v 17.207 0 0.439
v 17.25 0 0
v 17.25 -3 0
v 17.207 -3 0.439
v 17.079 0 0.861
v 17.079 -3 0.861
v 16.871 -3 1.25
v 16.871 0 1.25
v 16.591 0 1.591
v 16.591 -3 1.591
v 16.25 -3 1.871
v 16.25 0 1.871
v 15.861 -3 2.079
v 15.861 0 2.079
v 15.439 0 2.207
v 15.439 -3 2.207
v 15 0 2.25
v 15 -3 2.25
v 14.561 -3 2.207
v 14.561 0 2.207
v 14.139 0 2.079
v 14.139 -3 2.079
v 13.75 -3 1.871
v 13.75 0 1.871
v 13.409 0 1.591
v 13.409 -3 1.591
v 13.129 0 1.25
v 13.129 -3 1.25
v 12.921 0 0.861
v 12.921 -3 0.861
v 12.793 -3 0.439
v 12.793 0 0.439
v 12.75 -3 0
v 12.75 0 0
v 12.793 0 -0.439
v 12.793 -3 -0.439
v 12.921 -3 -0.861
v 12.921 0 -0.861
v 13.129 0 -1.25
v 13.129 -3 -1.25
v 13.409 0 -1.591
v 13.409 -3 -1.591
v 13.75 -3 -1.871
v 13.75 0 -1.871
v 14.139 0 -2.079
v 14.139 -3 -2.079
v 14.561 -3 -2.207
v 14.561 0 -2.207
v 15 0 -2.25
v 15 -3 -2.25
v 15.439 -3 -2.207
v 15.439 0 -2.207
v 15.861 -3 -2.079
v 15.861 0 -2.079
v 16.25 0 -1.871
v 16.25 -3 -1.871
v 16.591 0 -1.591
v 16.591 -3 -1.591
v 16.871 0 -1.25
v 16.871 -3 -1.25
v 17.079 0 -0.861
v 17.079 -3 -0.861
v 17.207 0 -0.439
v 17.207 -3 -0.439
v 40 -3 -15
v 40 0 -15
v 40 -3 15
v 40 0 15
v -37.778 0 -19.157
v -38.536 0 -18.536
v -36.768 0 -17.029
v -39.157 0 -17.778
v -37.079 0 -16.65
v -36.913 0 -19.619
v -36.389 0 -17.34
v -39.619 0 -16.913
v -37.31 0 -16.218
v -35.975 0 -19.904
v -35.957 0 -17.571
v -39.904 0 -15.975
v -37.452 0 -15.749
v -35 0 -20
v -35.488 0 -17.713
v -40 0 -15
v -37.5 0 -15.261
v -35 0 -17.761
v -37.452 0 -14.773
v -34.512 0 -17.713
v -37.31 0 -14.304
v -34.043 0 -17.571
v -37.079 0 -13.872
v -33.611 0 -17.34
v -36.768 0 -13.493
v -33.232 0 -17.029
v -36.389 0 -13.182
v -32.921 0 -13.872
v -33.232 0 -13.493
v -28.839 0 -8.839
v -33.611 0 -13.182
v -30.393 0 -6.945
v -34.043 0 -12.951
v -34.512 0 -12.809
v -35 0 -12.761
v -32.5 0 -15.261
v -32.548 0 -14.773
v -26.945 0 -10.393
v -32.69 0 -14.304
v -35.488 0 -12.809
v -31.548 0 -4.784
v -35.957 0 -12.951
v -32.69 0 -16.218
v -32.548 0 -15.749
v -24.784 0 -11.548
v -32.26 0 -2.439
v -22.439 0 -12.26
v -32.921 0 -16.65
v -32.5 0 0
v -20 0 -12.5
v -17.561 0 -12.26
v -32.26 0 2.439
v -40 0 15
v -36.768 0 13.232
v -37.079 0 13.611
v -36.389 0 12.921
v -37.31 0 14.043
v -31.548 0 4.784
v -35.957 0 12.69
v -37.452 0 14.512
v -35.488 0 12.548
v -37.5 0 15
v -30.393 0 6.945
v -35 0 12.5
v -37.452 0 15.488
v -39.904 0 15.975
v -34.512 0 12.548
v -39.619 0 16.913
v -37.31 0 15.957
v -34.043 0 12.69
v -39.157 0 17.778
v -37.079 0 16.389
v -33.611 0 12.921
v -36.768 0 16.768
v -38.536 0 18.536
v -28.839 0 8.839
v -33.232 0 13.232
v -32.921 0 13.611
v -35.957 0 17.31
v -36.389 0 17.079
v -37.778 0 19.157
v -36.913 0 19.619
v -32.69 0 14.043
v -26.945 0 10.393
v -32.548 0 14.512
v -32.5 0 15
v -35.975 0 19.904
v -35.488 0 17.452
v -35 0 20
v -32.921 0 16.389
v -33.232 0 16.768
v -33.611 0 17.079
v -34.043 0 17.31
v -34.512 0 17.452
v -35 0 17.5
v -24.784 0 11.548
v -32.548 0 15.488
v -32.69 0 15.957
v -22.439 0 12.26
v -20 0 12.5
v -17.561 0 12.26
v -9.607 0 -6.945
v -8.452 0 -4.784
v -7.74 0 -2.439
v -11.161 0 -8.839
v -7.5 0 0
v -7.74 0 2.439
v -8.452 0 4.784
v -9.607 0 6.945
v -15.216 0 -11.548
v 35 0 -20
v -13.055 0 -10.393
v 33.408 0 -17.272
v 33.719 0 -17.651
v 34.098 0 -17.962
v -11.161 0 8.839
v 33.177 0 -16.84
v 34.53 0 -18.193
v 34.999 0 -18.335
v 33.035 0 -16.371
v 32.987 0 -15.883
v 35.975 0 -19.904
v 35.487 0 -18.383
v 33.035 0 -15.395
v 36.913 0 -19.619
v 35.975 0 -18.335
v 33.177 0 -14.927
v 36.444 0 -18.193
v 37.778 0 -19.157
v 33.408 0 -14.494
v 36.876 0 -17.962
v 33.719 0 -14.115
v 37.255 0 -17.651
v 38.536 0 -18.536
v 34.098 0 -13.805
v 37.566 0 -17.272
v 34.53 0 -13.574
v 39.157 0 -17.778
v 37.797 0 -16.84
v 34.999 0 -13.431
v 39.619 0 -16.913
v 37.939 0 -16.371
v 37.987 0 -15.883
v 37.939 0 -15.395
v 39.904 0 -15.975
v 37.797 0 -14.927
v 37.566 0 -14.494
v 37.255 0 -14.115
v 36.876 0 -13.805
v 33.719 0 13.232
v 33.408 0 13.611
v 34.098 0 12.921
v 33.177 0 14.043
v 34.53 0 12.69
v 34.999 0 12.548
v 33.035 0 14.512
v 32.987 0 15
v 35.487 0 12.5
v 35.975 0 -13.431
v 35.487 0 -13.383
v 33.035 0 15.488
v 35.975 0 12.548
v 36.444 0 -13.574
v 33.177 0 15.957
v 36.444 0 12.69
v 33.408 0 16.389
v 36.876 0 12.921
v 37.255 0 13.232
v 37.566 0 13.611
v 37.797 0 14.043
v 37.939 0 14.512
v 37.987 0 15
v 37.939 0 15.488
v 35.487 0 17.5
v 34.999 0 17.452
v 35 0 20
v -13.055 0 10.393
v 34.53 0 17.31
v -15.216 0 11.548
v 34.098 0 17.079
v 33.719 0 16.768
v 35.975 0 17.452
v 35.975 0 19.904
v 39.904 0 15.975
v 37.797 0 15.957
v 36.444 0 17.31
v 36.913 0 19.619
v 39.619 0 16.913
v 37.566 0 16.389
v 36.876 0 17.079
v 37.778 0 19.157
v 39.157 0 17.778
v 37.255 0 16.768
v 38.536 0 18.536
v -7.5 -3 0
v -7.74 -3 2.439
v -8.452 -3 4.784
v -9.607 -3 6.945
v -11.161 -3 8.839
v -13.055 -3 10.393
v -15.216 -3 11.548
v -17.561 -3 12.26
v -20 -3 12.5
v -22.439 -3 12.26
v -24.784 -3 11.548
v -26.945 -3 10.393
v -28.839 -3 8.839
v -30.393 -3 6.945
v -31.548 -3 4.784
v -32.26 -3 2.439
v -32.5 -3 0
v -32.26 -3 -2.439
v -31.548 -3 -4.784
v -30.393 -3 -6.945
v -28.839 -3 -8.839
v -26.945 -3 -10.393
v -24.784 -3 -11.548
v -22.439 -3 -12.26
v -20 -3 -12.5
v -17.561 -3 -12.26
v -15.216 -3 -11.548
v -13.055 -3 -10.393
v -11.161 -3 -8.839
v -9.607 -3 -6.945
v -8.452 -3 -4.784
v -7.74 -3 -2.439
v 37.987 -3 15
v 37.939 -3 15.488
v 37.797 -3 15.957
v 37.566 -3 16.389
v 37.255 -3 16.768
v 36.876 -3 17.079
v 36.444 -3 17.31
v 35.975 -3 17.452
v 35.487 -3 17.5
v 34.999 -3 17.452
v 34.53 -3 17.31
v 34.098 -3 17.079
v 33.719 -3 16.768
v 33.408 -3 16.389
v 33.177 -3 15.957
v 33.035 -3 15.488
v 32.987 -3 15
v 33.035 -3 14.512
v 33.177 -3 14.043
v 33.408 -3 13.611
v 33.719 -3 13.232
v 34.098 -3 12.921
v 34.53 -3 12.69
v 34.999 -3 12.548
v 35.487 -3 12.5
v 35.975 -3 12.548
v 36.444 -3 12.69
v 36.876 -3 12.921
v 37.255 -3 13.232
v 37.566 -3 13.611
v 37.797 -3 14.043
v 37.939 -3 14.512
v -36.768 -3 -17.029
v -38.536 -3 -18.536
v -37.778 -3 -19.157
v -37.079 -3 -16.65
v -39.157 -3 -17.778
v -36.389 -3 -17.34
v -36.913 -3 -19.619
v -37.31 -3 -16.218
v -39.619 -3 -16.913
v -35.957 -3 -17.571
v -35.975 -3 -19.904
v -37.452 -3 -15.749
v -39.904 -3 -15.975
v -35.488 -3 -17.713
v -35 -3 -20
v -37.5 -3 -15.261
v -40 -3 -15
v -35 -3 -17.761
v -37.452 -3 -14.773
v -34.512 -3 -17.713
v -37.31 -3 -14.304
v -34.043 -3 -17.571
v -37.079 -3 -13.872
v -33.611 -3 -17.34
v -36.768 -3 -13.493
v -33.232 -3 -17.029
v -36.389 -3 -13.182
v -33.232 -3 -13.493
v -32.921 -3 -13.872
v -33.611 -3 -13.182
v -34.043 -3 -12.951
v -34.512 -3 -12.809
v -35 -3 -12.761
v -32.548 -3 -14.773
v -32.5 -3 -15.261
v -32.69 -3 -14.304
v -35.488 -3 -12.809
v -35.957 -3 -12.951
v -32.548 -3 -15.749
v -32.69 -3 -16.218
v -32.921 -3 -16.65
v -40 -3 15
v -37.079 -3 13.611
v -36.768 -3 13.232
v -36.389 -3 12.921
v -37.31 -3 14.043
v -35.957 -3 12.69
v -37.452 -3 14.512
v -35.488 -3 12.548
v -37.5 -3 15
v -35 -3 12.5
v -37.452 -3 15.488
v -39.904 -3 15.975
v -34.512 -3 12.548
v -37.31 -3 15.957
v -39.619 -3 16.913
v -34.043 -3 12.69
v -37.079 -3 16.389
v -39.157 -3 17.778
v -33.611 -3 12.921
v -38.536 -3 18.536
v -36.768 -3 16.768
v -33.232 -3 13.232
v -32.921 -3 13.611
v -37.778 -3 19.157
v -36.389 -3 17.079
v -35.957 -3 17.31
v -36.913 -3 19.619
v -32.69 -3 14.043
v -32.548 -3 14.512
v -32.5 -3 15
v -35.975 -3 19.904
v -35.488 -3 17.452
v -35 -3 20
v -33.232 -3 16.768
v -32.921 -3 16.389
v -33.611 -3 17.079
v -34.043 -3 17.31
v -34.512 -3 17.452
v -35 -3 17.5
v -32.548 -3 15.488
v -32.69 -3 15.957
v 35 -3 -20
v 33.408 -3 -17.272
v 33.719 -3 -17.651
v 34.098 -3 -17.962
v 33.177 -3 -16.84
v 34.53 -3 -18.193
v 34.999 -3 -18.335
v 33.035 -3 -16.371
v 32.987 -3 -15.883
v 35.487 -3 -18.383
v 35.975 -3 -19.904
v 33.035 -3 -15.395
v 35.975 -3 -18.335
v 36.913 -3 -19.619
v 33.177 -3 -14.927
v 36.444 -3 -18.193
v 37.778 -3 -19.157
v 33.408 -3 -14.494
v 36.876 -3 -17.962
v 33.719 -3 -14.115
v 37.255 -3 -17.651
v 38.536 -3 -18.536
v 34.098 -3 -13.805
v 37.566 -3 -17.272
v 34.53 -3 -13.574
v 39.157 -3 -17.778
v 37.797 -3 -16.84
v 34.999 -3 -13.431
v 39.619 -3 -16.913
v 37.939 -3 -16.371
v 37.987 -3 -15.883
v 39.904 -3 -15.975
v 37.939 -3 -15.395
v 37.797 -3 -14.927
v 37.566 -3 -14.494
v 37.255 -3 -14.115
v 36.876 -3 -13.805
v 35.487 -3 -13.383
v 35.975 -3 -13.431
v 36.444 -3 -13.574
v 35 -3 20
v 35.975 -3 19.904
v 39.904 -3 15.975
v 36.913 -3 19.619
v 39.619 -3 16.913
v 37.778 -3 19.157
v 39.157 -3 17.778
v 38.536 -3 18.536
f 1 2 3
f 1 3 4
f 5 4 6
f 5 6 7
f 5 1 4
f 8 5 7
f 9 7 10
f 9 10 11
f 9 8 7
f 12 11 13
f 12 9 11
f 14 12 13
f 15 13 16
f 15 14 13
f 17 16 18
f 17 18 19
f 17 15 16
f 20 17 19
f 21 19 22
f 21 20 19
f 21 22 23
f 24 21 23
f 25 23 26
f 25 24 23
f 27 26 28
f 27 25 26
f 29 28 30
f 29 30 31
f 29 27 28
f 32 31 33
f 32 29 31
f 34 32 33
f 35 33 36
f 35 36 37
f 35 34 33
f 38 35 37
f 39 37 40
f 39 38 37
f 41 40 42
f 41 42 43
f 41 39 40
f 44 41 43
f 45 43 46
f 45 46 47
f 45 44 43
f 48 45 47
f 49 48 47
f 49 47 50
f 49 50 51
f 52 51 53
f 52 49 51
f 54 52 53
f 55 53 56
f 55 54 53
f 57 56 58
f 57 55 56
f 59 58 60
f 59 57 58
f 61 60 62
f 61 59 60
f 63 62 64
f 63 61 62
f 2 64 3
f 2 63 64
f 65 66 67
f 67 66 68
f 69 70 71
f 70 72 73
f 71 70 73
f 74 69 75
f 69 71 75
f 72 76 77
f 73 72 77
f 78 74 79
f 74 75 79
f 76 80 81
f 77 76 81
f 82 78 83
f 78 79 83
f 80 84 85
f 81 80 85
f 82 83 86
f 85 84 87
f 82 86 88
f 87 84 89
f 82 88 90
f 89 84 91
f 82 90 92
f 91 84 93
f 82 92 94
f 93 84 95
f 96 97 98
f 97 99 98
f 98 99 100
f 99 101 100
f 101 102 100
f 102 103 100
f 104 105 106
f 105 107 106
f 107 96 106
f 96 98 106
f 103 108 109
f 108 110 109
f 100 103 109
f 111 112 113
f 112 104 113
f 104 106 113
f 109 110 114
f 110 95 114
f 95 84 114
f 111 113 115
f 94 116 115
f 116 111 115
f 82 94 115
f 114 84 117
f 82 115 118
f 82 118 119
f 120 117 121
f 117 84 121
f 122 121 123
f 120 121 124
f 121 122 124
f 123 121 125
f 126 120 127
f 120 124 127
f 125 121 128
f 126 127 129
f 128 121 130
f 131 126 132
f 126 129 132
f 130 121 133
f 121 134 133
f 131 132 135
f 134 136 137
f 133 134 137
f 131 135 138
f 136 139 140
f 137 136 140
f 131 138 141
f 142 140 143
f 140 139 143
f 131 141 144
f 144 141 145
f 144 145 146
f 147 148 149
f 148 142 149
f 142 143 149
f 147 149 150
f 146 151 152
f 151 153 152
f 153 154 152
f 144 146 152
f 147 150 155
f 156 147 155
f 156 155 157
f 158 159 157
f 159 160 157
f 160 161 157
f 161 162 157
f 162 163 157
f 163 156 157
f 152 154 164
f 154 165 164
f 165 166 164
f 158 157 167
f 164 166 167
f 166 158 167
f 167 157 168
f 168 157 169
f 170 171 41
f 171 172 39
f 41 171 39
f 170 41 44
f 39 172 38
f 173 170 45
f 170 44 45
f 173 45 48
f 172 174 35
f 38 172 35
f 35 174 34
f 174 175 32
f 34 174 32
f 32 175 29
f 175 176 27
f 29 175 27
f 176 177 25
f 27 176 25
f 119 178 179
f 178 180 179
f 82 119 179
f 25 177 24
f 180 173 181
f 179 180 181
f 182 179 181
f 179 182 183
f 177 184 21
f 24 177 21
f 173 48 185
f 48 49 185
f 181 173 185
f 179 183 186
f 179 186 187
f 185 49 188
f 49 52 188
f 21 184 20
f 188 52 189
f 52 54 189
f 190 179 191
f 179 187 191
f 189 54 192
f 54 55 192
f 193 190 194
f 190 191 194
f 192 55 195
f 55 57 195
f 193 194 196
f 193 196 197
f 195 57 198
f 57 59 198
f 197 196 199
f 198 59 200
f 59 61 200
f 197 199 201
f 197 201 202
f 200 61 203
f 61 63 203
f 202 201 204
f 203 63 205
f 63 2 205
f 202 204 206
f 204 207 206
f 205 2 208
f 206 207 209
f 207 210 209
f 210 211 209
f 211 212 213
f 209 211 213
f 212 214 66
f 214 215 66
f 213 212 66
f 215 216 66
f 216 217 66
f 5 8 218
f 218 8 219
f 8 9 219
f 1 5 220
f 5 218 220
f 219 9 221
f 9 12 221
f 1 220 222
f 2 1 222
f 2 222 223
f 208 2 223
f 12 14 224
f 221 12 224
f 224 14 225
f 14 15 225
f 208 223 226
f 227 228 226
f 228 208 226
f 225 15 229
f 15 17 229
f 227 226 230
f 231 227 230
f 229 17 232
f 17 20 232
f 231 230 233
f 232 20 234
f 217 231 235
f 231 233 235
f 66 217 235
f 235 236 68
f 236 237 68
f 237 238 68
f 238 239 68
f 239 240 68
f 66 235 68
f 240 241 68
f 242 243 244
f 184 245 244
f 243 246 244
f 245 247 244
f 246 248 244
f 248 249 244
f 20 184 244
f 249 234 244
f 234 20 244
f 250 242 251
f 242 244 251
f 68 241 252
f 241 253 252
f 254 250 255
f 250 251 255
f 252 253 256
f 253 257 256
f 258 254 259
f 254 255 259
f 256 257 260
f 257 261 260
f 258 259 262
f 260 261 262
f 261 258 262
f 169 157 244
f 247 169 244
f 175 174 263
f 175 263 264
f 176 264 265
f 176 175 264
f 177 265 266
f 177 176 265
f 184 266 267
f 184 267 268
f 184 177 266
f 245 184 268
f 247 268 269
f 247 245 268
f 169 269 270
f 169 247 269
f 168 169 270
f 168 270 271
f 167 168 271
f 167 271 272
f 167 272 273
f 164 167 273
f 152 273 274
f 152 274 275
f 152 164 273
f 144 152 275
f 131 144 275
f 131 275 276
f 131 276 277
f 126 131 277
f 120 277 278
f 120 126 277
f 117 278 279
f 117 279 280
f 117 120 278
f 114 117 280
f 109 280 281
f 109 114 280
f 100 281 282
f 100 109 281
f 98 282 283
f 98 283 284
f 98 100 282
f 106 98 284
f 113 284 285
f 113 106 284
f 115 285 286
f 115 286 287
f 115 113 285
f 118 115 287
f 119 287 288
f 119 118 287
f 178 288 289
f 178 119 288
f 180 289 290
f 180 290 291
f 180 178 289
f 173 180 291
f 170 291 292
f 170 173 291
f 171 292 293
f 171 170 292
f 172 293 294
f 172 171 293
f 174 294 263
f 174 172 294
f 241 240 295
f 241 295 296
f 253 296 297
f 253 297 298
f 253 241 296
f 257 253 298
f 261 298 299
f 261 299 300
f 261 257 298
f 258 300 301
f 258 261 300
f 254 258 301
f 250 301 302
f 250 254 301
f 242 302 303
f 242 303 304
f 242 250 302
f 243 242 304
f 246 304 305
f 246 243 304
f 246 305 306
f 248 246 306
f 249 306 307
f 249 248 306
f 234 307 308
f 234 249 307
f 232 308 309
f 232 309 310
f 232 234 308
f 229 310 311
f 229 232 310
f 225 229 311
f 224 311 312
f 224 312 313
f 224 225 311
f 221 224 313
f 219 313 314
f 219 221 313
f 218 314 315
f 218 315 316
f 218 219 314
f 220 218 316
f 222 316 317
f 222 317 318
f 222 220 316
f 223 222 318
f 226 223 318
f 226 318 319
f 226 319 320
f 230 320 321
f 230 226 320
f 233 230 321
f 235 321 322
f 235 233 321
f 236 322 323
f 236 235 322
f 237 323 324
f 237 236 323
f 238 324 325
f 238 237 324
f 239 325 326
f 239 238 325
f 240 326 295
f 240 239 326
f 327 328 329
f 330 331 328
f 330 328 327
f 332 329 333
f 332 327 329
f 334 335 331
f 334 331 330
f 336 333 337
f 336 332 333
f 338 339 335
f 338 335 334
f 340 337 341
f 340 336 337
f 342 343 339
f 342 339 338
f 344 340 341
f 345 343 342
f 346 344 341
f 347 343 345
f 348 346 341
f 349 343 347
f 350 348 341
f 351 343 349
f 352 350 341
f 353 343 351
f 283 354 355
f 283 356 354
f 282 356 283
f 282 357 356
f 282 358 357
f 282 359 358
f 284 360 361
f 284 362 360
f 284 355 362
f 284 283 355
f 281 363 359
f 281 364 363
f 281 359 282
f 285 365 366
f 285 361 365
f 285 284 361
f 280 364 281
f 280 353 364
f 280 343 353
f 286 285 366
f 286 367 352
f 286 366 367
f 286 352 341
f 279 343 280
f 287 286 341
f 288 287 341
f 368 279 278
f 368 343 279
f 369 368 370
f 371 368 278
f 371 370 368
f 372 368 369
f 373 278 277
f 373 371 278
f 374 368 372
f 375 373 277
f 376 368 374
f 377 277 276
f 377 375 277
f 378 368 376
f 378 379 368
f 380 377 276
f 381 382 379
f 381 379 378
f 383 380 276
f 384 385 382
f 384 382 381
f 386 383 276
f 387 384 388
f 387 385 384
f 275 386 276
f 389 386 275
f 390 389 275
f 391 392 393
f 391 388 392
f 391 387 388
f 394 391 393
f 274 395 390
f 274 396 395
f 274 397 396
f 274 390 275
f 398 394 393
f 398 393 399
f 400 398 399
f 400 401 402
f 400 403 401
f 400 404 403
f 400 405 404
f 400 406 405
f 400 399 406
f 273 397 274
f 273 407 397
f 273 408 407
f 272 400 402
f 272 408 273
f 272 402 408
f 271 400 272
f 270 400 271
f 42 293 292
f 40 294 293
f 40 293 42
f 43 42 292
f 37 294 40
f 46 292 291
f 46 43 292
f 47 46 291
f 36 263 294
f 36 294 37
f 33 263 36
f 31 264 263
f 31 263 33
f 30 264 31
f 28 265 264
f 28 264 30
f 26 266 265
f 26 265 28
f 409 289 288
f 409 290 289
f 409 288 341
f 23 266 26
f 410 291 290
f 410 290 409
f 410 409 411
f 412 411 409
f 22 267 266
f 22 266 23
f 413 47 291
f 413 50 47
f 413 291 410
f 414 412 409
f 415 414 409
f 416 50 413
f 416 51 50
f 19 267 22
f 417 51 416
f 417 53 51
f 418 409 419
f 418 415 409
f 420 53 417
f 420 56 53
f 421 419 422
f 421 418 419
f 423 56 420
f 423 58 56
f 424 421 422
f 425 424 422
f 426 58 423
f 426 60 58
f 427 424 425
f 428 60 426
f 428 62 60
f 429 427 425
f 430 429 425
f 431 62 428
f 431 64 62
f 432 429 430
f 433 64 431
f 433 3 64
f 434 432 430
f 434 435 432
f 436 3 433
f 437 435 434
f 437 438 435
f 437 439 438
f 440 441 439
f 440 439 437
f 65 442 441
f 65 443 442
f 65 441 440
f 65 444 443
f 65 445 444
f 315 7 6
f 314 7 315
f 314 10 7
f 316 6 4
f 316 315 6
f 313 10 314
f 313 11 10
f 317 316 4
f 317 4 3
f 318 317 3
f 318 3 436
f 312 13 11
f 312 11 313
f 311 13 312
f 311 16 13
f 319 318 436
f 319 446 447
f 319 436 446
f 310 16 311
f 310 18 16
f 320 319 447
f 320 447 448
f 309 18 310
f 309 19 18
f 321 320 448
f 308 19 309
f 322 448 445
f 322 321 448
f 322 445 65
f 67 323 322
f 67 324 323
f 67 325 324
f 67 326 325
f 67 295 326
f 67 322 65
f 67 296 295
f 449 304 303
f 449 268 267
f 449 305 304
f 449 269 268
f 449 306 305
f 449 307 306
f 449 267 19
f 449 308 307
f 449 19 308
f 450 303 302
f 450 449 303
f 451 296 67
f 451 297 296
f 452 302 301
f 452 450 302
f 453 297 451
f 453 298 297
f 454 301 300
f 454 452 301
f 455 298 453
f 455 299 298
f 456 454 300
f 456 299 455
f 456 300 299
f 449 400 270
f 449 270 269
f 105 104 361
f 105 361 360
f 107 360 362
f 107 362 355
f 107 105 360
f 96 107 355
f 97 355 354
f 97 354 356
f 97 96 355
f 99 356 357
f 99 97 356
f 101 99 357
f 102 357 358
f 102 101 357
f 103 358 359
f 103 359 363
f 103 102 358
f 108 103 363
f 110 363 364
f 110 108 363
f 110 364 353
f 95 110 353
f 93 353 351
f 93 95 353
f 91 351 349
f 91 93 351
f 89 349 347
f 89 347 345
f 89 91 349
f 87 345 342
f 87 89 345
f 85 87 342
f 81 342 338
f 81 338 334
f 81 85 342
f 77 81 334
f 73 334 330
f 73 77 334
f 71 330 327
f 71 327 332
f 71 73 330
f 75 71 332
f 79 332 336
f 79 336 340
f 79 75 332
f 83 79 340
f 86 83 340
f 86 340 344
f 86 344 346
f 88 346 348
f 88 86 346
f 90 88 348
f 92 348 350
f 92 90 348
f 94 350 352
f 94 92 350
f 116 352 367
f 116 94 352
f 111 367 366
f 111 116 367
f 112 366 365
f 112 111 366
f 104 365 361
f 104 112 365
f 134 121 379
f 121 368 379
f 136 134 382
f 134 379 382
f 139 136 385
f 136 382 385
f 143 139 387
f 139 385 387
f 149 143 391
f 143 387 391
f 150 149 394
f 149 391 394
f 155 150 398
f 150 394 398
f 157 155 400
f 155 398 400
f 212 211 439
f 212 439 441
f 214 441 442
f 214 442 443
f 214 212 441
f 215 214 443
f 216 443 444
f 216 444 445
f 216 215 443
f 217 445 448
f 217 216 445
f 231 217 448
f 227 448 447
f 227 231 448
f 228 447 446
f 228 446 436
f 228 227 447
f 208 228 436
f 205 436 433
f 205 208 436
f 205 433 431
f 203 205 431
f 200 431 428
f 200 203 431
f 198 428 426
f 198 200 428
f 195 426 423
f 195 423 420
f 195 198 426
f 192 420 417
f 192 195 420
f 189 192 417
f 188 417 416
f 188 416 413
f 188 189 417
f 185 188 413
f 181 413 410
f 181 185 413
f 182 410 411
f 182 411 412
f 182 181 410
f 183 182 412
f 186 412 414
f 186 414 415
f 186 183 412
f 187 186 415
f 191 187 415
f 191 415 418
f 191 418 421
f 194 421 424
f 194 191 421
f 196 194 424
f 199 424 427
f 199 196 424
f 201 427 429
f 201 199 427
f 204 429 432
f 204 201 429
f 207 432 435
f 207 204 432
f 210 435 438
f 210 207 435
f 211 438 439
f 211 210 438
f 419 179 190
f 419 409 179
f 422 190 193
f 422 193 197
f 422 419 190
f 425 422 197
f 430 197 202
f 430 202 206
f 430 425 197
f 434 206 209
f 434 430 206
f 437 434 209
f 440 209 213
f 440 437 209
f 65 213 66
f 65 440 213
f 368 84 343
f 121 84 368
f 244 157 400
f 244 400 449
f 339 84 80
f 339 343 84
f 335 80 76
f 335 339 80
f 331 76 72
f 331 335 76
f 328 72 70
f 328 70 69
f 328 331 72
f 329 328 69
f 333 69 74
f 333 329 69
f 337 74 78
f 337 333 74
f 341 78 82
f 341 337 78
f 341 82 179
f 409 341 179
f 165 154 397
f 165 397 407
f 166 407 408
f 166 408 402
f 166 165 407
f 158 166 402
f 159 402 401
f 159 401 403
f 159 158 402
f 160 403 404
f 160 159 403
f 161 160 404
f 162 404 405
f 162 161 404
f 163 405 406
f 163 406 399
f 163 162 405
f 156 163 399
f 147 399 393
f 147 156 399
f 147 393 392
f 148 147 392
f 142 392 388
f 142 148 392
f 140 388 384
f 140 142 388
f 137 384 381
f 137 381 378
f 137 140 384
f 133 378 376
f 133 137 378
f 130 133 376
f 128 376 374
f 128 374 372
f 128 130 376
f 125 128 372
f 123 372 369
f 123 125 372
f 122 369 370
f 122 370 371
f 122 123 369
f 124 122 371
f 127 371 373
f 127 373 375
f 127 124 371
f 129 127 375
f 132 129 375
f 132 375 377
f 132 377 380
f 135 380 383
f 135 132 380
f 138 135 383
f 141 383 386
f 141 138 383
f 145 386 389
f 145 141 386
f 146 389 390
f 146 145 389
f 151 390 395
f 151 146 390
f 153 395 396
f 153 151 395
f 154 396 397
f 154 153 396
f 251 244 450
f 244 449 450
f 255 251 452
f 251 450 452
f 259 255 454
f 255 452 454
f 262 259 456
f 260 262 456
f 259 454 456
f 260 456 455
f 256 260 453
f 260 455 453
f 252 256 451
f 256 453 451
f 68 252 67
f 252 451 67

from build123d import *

# Parameters (mm, degrees)
F0_W     = 80
F0_H     = 40
F0_R     = 2.5
F0_R_2   = 12.5
F0_R_3   = 2.25
F1_DEPTH = 3
F2_R     = 5


with BuildPart() as f1:
    # F0 (on Front) → F1 (new body)
    with BuildSketch(Plane.XZ):
        Rectangle(F0_W, F0_H)
        with Locations((-35, -15.260881)):
            Circle(F0_R, mode=Mode.SUBTRACT)
        with Locations((35.486974, -15.883215)):
            Circle(F0_R, mode=Mode.SUBTRACT)
        with Locations((-20, 0)):
            Circle(F0_R_2, mode=Mode.SUBTRACT)
        with Locations((-35, 15)):
            Circle(F0_R, mode=Mode.SUBTRACT)
        with Locations((15, 0)):
            Circle(F0_R_3, mode=Mode.SUBTRACT)
        with Locations((35.486974, 15)):
            Circle(F0_R, mode=Mode.SUBTRACT)
    extrude(amount=F1_DEPTH)

    # F2
    f2_edges = [f1.edges().sort_by_distance(p)[0] for p in [
        (-40, -1.5, 20),
        (40, -1.5, 20),
        (40, -1.5, -20),
        (-40, -1.5, -20),
    ]]
    fillet(f2_edges, radius=F2_R)


solid = f1.part
